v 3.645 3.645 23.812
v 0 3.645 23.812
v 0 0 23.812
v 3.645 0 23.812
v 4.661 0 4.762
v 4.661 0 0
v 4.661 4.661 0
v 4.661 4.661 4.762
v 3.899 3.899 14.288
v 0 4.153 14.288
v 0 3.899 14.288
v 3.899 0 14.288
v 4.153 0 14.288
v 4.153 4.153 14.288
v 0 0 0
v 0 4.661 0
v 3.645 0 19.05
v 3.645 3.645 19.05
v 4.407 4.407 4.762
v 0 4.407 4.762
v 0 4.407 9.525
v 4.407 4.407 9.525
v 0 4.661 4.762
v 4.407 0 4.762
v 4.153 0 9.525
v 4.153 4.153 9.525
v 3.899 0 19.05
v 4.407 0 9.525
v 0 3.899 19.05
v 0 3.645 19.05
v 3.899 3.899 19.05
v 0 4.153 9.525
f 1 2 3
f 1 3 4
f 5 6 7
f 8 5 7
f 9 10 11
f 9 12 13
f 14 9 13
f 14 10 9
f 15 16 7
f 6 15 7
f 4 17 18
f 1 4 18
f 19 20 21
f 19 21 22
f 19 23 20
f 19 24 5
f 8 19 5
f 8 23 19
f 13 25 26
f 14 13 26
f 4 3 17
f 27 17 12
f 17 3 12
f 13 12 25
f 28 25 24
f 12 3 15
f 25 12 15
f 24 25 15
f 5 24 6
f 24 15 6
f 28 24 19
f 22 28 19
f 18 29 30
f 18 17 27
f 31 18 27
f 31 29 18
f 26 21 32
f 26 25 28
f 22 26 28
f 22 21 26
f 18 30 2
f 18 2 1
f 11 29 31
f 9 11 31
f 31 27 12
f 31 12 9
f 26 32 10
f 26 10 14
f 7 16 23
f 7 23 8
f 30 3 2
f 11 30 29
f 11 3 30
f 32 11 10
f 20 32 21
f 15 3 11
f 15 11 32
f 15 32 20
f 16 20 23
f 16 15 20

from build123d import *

# Parameters (mm, degrees)
F1_W      = 4.6609
F1_H      = 4.6609
F2_DEPTH  = 4.7625
F3_W      = 4.4069
F3_H      = 4.4069
F4_DEPTH  = 4.7625
F5_W      = 4.1529
F5_H      = 4.1529
F6_DEPTH  = 4.7625
F7_W      = 3.8989
F7_H      = 3.8989
F8_DEPTH  = 4.7625
F9_W      = 3.6449
F9_H      = 3.6449
F10_DEPTH = 4.7625


# Not quite as in the source:
# - a variable given as a bare number and used for a length is read in inches; the dataset says mm whatever the document's units were


with BuildPart() as f2:
    # F1 (on Top) → F2 (new body)
    with BuildSketch(Plane.XY):
        with Locations((2.33045, 2.33045)):
            Rectangle(F1_W, F1_H)
    extrude(amount=F2_DEPTH)

    # F3 (on face) → F4 (join)
    with BuildSketch(Plane.XY.offset(4.7625)):
        with Locations((2.20345, 2.20345)):
            Rectangle(F3_W, F3_H)
    extrude(amount=F4_DEPTH)

    # F5 (on face) → F6 (join)
    with BuildSketch(Plane.XY.offset(9.525)):
        with Locations((2.07645, 2.07645)):
            Rectangle(F5_W, F5_H)
    extrude(amount=F6_DEPTH)

    # F7 (on face) → F8 (join)
    with BuildSketch(Plane.XY.offset(14.2875)):
        with Locations((1.94945, 1.94945)):
            Rectangle(F7_W, F7_H)
    extrude(amount=F8_DEPTH)

    # F9 (on face) → F10 (join)
    with BuildSketch(Plane.XY.offset(19.05)):
        with Locations((1.82245, 1.82245)):
            Rectangle(F9_W, F9_H)
    extrude(amount=F10_DEPTH)


solid = f2.part
